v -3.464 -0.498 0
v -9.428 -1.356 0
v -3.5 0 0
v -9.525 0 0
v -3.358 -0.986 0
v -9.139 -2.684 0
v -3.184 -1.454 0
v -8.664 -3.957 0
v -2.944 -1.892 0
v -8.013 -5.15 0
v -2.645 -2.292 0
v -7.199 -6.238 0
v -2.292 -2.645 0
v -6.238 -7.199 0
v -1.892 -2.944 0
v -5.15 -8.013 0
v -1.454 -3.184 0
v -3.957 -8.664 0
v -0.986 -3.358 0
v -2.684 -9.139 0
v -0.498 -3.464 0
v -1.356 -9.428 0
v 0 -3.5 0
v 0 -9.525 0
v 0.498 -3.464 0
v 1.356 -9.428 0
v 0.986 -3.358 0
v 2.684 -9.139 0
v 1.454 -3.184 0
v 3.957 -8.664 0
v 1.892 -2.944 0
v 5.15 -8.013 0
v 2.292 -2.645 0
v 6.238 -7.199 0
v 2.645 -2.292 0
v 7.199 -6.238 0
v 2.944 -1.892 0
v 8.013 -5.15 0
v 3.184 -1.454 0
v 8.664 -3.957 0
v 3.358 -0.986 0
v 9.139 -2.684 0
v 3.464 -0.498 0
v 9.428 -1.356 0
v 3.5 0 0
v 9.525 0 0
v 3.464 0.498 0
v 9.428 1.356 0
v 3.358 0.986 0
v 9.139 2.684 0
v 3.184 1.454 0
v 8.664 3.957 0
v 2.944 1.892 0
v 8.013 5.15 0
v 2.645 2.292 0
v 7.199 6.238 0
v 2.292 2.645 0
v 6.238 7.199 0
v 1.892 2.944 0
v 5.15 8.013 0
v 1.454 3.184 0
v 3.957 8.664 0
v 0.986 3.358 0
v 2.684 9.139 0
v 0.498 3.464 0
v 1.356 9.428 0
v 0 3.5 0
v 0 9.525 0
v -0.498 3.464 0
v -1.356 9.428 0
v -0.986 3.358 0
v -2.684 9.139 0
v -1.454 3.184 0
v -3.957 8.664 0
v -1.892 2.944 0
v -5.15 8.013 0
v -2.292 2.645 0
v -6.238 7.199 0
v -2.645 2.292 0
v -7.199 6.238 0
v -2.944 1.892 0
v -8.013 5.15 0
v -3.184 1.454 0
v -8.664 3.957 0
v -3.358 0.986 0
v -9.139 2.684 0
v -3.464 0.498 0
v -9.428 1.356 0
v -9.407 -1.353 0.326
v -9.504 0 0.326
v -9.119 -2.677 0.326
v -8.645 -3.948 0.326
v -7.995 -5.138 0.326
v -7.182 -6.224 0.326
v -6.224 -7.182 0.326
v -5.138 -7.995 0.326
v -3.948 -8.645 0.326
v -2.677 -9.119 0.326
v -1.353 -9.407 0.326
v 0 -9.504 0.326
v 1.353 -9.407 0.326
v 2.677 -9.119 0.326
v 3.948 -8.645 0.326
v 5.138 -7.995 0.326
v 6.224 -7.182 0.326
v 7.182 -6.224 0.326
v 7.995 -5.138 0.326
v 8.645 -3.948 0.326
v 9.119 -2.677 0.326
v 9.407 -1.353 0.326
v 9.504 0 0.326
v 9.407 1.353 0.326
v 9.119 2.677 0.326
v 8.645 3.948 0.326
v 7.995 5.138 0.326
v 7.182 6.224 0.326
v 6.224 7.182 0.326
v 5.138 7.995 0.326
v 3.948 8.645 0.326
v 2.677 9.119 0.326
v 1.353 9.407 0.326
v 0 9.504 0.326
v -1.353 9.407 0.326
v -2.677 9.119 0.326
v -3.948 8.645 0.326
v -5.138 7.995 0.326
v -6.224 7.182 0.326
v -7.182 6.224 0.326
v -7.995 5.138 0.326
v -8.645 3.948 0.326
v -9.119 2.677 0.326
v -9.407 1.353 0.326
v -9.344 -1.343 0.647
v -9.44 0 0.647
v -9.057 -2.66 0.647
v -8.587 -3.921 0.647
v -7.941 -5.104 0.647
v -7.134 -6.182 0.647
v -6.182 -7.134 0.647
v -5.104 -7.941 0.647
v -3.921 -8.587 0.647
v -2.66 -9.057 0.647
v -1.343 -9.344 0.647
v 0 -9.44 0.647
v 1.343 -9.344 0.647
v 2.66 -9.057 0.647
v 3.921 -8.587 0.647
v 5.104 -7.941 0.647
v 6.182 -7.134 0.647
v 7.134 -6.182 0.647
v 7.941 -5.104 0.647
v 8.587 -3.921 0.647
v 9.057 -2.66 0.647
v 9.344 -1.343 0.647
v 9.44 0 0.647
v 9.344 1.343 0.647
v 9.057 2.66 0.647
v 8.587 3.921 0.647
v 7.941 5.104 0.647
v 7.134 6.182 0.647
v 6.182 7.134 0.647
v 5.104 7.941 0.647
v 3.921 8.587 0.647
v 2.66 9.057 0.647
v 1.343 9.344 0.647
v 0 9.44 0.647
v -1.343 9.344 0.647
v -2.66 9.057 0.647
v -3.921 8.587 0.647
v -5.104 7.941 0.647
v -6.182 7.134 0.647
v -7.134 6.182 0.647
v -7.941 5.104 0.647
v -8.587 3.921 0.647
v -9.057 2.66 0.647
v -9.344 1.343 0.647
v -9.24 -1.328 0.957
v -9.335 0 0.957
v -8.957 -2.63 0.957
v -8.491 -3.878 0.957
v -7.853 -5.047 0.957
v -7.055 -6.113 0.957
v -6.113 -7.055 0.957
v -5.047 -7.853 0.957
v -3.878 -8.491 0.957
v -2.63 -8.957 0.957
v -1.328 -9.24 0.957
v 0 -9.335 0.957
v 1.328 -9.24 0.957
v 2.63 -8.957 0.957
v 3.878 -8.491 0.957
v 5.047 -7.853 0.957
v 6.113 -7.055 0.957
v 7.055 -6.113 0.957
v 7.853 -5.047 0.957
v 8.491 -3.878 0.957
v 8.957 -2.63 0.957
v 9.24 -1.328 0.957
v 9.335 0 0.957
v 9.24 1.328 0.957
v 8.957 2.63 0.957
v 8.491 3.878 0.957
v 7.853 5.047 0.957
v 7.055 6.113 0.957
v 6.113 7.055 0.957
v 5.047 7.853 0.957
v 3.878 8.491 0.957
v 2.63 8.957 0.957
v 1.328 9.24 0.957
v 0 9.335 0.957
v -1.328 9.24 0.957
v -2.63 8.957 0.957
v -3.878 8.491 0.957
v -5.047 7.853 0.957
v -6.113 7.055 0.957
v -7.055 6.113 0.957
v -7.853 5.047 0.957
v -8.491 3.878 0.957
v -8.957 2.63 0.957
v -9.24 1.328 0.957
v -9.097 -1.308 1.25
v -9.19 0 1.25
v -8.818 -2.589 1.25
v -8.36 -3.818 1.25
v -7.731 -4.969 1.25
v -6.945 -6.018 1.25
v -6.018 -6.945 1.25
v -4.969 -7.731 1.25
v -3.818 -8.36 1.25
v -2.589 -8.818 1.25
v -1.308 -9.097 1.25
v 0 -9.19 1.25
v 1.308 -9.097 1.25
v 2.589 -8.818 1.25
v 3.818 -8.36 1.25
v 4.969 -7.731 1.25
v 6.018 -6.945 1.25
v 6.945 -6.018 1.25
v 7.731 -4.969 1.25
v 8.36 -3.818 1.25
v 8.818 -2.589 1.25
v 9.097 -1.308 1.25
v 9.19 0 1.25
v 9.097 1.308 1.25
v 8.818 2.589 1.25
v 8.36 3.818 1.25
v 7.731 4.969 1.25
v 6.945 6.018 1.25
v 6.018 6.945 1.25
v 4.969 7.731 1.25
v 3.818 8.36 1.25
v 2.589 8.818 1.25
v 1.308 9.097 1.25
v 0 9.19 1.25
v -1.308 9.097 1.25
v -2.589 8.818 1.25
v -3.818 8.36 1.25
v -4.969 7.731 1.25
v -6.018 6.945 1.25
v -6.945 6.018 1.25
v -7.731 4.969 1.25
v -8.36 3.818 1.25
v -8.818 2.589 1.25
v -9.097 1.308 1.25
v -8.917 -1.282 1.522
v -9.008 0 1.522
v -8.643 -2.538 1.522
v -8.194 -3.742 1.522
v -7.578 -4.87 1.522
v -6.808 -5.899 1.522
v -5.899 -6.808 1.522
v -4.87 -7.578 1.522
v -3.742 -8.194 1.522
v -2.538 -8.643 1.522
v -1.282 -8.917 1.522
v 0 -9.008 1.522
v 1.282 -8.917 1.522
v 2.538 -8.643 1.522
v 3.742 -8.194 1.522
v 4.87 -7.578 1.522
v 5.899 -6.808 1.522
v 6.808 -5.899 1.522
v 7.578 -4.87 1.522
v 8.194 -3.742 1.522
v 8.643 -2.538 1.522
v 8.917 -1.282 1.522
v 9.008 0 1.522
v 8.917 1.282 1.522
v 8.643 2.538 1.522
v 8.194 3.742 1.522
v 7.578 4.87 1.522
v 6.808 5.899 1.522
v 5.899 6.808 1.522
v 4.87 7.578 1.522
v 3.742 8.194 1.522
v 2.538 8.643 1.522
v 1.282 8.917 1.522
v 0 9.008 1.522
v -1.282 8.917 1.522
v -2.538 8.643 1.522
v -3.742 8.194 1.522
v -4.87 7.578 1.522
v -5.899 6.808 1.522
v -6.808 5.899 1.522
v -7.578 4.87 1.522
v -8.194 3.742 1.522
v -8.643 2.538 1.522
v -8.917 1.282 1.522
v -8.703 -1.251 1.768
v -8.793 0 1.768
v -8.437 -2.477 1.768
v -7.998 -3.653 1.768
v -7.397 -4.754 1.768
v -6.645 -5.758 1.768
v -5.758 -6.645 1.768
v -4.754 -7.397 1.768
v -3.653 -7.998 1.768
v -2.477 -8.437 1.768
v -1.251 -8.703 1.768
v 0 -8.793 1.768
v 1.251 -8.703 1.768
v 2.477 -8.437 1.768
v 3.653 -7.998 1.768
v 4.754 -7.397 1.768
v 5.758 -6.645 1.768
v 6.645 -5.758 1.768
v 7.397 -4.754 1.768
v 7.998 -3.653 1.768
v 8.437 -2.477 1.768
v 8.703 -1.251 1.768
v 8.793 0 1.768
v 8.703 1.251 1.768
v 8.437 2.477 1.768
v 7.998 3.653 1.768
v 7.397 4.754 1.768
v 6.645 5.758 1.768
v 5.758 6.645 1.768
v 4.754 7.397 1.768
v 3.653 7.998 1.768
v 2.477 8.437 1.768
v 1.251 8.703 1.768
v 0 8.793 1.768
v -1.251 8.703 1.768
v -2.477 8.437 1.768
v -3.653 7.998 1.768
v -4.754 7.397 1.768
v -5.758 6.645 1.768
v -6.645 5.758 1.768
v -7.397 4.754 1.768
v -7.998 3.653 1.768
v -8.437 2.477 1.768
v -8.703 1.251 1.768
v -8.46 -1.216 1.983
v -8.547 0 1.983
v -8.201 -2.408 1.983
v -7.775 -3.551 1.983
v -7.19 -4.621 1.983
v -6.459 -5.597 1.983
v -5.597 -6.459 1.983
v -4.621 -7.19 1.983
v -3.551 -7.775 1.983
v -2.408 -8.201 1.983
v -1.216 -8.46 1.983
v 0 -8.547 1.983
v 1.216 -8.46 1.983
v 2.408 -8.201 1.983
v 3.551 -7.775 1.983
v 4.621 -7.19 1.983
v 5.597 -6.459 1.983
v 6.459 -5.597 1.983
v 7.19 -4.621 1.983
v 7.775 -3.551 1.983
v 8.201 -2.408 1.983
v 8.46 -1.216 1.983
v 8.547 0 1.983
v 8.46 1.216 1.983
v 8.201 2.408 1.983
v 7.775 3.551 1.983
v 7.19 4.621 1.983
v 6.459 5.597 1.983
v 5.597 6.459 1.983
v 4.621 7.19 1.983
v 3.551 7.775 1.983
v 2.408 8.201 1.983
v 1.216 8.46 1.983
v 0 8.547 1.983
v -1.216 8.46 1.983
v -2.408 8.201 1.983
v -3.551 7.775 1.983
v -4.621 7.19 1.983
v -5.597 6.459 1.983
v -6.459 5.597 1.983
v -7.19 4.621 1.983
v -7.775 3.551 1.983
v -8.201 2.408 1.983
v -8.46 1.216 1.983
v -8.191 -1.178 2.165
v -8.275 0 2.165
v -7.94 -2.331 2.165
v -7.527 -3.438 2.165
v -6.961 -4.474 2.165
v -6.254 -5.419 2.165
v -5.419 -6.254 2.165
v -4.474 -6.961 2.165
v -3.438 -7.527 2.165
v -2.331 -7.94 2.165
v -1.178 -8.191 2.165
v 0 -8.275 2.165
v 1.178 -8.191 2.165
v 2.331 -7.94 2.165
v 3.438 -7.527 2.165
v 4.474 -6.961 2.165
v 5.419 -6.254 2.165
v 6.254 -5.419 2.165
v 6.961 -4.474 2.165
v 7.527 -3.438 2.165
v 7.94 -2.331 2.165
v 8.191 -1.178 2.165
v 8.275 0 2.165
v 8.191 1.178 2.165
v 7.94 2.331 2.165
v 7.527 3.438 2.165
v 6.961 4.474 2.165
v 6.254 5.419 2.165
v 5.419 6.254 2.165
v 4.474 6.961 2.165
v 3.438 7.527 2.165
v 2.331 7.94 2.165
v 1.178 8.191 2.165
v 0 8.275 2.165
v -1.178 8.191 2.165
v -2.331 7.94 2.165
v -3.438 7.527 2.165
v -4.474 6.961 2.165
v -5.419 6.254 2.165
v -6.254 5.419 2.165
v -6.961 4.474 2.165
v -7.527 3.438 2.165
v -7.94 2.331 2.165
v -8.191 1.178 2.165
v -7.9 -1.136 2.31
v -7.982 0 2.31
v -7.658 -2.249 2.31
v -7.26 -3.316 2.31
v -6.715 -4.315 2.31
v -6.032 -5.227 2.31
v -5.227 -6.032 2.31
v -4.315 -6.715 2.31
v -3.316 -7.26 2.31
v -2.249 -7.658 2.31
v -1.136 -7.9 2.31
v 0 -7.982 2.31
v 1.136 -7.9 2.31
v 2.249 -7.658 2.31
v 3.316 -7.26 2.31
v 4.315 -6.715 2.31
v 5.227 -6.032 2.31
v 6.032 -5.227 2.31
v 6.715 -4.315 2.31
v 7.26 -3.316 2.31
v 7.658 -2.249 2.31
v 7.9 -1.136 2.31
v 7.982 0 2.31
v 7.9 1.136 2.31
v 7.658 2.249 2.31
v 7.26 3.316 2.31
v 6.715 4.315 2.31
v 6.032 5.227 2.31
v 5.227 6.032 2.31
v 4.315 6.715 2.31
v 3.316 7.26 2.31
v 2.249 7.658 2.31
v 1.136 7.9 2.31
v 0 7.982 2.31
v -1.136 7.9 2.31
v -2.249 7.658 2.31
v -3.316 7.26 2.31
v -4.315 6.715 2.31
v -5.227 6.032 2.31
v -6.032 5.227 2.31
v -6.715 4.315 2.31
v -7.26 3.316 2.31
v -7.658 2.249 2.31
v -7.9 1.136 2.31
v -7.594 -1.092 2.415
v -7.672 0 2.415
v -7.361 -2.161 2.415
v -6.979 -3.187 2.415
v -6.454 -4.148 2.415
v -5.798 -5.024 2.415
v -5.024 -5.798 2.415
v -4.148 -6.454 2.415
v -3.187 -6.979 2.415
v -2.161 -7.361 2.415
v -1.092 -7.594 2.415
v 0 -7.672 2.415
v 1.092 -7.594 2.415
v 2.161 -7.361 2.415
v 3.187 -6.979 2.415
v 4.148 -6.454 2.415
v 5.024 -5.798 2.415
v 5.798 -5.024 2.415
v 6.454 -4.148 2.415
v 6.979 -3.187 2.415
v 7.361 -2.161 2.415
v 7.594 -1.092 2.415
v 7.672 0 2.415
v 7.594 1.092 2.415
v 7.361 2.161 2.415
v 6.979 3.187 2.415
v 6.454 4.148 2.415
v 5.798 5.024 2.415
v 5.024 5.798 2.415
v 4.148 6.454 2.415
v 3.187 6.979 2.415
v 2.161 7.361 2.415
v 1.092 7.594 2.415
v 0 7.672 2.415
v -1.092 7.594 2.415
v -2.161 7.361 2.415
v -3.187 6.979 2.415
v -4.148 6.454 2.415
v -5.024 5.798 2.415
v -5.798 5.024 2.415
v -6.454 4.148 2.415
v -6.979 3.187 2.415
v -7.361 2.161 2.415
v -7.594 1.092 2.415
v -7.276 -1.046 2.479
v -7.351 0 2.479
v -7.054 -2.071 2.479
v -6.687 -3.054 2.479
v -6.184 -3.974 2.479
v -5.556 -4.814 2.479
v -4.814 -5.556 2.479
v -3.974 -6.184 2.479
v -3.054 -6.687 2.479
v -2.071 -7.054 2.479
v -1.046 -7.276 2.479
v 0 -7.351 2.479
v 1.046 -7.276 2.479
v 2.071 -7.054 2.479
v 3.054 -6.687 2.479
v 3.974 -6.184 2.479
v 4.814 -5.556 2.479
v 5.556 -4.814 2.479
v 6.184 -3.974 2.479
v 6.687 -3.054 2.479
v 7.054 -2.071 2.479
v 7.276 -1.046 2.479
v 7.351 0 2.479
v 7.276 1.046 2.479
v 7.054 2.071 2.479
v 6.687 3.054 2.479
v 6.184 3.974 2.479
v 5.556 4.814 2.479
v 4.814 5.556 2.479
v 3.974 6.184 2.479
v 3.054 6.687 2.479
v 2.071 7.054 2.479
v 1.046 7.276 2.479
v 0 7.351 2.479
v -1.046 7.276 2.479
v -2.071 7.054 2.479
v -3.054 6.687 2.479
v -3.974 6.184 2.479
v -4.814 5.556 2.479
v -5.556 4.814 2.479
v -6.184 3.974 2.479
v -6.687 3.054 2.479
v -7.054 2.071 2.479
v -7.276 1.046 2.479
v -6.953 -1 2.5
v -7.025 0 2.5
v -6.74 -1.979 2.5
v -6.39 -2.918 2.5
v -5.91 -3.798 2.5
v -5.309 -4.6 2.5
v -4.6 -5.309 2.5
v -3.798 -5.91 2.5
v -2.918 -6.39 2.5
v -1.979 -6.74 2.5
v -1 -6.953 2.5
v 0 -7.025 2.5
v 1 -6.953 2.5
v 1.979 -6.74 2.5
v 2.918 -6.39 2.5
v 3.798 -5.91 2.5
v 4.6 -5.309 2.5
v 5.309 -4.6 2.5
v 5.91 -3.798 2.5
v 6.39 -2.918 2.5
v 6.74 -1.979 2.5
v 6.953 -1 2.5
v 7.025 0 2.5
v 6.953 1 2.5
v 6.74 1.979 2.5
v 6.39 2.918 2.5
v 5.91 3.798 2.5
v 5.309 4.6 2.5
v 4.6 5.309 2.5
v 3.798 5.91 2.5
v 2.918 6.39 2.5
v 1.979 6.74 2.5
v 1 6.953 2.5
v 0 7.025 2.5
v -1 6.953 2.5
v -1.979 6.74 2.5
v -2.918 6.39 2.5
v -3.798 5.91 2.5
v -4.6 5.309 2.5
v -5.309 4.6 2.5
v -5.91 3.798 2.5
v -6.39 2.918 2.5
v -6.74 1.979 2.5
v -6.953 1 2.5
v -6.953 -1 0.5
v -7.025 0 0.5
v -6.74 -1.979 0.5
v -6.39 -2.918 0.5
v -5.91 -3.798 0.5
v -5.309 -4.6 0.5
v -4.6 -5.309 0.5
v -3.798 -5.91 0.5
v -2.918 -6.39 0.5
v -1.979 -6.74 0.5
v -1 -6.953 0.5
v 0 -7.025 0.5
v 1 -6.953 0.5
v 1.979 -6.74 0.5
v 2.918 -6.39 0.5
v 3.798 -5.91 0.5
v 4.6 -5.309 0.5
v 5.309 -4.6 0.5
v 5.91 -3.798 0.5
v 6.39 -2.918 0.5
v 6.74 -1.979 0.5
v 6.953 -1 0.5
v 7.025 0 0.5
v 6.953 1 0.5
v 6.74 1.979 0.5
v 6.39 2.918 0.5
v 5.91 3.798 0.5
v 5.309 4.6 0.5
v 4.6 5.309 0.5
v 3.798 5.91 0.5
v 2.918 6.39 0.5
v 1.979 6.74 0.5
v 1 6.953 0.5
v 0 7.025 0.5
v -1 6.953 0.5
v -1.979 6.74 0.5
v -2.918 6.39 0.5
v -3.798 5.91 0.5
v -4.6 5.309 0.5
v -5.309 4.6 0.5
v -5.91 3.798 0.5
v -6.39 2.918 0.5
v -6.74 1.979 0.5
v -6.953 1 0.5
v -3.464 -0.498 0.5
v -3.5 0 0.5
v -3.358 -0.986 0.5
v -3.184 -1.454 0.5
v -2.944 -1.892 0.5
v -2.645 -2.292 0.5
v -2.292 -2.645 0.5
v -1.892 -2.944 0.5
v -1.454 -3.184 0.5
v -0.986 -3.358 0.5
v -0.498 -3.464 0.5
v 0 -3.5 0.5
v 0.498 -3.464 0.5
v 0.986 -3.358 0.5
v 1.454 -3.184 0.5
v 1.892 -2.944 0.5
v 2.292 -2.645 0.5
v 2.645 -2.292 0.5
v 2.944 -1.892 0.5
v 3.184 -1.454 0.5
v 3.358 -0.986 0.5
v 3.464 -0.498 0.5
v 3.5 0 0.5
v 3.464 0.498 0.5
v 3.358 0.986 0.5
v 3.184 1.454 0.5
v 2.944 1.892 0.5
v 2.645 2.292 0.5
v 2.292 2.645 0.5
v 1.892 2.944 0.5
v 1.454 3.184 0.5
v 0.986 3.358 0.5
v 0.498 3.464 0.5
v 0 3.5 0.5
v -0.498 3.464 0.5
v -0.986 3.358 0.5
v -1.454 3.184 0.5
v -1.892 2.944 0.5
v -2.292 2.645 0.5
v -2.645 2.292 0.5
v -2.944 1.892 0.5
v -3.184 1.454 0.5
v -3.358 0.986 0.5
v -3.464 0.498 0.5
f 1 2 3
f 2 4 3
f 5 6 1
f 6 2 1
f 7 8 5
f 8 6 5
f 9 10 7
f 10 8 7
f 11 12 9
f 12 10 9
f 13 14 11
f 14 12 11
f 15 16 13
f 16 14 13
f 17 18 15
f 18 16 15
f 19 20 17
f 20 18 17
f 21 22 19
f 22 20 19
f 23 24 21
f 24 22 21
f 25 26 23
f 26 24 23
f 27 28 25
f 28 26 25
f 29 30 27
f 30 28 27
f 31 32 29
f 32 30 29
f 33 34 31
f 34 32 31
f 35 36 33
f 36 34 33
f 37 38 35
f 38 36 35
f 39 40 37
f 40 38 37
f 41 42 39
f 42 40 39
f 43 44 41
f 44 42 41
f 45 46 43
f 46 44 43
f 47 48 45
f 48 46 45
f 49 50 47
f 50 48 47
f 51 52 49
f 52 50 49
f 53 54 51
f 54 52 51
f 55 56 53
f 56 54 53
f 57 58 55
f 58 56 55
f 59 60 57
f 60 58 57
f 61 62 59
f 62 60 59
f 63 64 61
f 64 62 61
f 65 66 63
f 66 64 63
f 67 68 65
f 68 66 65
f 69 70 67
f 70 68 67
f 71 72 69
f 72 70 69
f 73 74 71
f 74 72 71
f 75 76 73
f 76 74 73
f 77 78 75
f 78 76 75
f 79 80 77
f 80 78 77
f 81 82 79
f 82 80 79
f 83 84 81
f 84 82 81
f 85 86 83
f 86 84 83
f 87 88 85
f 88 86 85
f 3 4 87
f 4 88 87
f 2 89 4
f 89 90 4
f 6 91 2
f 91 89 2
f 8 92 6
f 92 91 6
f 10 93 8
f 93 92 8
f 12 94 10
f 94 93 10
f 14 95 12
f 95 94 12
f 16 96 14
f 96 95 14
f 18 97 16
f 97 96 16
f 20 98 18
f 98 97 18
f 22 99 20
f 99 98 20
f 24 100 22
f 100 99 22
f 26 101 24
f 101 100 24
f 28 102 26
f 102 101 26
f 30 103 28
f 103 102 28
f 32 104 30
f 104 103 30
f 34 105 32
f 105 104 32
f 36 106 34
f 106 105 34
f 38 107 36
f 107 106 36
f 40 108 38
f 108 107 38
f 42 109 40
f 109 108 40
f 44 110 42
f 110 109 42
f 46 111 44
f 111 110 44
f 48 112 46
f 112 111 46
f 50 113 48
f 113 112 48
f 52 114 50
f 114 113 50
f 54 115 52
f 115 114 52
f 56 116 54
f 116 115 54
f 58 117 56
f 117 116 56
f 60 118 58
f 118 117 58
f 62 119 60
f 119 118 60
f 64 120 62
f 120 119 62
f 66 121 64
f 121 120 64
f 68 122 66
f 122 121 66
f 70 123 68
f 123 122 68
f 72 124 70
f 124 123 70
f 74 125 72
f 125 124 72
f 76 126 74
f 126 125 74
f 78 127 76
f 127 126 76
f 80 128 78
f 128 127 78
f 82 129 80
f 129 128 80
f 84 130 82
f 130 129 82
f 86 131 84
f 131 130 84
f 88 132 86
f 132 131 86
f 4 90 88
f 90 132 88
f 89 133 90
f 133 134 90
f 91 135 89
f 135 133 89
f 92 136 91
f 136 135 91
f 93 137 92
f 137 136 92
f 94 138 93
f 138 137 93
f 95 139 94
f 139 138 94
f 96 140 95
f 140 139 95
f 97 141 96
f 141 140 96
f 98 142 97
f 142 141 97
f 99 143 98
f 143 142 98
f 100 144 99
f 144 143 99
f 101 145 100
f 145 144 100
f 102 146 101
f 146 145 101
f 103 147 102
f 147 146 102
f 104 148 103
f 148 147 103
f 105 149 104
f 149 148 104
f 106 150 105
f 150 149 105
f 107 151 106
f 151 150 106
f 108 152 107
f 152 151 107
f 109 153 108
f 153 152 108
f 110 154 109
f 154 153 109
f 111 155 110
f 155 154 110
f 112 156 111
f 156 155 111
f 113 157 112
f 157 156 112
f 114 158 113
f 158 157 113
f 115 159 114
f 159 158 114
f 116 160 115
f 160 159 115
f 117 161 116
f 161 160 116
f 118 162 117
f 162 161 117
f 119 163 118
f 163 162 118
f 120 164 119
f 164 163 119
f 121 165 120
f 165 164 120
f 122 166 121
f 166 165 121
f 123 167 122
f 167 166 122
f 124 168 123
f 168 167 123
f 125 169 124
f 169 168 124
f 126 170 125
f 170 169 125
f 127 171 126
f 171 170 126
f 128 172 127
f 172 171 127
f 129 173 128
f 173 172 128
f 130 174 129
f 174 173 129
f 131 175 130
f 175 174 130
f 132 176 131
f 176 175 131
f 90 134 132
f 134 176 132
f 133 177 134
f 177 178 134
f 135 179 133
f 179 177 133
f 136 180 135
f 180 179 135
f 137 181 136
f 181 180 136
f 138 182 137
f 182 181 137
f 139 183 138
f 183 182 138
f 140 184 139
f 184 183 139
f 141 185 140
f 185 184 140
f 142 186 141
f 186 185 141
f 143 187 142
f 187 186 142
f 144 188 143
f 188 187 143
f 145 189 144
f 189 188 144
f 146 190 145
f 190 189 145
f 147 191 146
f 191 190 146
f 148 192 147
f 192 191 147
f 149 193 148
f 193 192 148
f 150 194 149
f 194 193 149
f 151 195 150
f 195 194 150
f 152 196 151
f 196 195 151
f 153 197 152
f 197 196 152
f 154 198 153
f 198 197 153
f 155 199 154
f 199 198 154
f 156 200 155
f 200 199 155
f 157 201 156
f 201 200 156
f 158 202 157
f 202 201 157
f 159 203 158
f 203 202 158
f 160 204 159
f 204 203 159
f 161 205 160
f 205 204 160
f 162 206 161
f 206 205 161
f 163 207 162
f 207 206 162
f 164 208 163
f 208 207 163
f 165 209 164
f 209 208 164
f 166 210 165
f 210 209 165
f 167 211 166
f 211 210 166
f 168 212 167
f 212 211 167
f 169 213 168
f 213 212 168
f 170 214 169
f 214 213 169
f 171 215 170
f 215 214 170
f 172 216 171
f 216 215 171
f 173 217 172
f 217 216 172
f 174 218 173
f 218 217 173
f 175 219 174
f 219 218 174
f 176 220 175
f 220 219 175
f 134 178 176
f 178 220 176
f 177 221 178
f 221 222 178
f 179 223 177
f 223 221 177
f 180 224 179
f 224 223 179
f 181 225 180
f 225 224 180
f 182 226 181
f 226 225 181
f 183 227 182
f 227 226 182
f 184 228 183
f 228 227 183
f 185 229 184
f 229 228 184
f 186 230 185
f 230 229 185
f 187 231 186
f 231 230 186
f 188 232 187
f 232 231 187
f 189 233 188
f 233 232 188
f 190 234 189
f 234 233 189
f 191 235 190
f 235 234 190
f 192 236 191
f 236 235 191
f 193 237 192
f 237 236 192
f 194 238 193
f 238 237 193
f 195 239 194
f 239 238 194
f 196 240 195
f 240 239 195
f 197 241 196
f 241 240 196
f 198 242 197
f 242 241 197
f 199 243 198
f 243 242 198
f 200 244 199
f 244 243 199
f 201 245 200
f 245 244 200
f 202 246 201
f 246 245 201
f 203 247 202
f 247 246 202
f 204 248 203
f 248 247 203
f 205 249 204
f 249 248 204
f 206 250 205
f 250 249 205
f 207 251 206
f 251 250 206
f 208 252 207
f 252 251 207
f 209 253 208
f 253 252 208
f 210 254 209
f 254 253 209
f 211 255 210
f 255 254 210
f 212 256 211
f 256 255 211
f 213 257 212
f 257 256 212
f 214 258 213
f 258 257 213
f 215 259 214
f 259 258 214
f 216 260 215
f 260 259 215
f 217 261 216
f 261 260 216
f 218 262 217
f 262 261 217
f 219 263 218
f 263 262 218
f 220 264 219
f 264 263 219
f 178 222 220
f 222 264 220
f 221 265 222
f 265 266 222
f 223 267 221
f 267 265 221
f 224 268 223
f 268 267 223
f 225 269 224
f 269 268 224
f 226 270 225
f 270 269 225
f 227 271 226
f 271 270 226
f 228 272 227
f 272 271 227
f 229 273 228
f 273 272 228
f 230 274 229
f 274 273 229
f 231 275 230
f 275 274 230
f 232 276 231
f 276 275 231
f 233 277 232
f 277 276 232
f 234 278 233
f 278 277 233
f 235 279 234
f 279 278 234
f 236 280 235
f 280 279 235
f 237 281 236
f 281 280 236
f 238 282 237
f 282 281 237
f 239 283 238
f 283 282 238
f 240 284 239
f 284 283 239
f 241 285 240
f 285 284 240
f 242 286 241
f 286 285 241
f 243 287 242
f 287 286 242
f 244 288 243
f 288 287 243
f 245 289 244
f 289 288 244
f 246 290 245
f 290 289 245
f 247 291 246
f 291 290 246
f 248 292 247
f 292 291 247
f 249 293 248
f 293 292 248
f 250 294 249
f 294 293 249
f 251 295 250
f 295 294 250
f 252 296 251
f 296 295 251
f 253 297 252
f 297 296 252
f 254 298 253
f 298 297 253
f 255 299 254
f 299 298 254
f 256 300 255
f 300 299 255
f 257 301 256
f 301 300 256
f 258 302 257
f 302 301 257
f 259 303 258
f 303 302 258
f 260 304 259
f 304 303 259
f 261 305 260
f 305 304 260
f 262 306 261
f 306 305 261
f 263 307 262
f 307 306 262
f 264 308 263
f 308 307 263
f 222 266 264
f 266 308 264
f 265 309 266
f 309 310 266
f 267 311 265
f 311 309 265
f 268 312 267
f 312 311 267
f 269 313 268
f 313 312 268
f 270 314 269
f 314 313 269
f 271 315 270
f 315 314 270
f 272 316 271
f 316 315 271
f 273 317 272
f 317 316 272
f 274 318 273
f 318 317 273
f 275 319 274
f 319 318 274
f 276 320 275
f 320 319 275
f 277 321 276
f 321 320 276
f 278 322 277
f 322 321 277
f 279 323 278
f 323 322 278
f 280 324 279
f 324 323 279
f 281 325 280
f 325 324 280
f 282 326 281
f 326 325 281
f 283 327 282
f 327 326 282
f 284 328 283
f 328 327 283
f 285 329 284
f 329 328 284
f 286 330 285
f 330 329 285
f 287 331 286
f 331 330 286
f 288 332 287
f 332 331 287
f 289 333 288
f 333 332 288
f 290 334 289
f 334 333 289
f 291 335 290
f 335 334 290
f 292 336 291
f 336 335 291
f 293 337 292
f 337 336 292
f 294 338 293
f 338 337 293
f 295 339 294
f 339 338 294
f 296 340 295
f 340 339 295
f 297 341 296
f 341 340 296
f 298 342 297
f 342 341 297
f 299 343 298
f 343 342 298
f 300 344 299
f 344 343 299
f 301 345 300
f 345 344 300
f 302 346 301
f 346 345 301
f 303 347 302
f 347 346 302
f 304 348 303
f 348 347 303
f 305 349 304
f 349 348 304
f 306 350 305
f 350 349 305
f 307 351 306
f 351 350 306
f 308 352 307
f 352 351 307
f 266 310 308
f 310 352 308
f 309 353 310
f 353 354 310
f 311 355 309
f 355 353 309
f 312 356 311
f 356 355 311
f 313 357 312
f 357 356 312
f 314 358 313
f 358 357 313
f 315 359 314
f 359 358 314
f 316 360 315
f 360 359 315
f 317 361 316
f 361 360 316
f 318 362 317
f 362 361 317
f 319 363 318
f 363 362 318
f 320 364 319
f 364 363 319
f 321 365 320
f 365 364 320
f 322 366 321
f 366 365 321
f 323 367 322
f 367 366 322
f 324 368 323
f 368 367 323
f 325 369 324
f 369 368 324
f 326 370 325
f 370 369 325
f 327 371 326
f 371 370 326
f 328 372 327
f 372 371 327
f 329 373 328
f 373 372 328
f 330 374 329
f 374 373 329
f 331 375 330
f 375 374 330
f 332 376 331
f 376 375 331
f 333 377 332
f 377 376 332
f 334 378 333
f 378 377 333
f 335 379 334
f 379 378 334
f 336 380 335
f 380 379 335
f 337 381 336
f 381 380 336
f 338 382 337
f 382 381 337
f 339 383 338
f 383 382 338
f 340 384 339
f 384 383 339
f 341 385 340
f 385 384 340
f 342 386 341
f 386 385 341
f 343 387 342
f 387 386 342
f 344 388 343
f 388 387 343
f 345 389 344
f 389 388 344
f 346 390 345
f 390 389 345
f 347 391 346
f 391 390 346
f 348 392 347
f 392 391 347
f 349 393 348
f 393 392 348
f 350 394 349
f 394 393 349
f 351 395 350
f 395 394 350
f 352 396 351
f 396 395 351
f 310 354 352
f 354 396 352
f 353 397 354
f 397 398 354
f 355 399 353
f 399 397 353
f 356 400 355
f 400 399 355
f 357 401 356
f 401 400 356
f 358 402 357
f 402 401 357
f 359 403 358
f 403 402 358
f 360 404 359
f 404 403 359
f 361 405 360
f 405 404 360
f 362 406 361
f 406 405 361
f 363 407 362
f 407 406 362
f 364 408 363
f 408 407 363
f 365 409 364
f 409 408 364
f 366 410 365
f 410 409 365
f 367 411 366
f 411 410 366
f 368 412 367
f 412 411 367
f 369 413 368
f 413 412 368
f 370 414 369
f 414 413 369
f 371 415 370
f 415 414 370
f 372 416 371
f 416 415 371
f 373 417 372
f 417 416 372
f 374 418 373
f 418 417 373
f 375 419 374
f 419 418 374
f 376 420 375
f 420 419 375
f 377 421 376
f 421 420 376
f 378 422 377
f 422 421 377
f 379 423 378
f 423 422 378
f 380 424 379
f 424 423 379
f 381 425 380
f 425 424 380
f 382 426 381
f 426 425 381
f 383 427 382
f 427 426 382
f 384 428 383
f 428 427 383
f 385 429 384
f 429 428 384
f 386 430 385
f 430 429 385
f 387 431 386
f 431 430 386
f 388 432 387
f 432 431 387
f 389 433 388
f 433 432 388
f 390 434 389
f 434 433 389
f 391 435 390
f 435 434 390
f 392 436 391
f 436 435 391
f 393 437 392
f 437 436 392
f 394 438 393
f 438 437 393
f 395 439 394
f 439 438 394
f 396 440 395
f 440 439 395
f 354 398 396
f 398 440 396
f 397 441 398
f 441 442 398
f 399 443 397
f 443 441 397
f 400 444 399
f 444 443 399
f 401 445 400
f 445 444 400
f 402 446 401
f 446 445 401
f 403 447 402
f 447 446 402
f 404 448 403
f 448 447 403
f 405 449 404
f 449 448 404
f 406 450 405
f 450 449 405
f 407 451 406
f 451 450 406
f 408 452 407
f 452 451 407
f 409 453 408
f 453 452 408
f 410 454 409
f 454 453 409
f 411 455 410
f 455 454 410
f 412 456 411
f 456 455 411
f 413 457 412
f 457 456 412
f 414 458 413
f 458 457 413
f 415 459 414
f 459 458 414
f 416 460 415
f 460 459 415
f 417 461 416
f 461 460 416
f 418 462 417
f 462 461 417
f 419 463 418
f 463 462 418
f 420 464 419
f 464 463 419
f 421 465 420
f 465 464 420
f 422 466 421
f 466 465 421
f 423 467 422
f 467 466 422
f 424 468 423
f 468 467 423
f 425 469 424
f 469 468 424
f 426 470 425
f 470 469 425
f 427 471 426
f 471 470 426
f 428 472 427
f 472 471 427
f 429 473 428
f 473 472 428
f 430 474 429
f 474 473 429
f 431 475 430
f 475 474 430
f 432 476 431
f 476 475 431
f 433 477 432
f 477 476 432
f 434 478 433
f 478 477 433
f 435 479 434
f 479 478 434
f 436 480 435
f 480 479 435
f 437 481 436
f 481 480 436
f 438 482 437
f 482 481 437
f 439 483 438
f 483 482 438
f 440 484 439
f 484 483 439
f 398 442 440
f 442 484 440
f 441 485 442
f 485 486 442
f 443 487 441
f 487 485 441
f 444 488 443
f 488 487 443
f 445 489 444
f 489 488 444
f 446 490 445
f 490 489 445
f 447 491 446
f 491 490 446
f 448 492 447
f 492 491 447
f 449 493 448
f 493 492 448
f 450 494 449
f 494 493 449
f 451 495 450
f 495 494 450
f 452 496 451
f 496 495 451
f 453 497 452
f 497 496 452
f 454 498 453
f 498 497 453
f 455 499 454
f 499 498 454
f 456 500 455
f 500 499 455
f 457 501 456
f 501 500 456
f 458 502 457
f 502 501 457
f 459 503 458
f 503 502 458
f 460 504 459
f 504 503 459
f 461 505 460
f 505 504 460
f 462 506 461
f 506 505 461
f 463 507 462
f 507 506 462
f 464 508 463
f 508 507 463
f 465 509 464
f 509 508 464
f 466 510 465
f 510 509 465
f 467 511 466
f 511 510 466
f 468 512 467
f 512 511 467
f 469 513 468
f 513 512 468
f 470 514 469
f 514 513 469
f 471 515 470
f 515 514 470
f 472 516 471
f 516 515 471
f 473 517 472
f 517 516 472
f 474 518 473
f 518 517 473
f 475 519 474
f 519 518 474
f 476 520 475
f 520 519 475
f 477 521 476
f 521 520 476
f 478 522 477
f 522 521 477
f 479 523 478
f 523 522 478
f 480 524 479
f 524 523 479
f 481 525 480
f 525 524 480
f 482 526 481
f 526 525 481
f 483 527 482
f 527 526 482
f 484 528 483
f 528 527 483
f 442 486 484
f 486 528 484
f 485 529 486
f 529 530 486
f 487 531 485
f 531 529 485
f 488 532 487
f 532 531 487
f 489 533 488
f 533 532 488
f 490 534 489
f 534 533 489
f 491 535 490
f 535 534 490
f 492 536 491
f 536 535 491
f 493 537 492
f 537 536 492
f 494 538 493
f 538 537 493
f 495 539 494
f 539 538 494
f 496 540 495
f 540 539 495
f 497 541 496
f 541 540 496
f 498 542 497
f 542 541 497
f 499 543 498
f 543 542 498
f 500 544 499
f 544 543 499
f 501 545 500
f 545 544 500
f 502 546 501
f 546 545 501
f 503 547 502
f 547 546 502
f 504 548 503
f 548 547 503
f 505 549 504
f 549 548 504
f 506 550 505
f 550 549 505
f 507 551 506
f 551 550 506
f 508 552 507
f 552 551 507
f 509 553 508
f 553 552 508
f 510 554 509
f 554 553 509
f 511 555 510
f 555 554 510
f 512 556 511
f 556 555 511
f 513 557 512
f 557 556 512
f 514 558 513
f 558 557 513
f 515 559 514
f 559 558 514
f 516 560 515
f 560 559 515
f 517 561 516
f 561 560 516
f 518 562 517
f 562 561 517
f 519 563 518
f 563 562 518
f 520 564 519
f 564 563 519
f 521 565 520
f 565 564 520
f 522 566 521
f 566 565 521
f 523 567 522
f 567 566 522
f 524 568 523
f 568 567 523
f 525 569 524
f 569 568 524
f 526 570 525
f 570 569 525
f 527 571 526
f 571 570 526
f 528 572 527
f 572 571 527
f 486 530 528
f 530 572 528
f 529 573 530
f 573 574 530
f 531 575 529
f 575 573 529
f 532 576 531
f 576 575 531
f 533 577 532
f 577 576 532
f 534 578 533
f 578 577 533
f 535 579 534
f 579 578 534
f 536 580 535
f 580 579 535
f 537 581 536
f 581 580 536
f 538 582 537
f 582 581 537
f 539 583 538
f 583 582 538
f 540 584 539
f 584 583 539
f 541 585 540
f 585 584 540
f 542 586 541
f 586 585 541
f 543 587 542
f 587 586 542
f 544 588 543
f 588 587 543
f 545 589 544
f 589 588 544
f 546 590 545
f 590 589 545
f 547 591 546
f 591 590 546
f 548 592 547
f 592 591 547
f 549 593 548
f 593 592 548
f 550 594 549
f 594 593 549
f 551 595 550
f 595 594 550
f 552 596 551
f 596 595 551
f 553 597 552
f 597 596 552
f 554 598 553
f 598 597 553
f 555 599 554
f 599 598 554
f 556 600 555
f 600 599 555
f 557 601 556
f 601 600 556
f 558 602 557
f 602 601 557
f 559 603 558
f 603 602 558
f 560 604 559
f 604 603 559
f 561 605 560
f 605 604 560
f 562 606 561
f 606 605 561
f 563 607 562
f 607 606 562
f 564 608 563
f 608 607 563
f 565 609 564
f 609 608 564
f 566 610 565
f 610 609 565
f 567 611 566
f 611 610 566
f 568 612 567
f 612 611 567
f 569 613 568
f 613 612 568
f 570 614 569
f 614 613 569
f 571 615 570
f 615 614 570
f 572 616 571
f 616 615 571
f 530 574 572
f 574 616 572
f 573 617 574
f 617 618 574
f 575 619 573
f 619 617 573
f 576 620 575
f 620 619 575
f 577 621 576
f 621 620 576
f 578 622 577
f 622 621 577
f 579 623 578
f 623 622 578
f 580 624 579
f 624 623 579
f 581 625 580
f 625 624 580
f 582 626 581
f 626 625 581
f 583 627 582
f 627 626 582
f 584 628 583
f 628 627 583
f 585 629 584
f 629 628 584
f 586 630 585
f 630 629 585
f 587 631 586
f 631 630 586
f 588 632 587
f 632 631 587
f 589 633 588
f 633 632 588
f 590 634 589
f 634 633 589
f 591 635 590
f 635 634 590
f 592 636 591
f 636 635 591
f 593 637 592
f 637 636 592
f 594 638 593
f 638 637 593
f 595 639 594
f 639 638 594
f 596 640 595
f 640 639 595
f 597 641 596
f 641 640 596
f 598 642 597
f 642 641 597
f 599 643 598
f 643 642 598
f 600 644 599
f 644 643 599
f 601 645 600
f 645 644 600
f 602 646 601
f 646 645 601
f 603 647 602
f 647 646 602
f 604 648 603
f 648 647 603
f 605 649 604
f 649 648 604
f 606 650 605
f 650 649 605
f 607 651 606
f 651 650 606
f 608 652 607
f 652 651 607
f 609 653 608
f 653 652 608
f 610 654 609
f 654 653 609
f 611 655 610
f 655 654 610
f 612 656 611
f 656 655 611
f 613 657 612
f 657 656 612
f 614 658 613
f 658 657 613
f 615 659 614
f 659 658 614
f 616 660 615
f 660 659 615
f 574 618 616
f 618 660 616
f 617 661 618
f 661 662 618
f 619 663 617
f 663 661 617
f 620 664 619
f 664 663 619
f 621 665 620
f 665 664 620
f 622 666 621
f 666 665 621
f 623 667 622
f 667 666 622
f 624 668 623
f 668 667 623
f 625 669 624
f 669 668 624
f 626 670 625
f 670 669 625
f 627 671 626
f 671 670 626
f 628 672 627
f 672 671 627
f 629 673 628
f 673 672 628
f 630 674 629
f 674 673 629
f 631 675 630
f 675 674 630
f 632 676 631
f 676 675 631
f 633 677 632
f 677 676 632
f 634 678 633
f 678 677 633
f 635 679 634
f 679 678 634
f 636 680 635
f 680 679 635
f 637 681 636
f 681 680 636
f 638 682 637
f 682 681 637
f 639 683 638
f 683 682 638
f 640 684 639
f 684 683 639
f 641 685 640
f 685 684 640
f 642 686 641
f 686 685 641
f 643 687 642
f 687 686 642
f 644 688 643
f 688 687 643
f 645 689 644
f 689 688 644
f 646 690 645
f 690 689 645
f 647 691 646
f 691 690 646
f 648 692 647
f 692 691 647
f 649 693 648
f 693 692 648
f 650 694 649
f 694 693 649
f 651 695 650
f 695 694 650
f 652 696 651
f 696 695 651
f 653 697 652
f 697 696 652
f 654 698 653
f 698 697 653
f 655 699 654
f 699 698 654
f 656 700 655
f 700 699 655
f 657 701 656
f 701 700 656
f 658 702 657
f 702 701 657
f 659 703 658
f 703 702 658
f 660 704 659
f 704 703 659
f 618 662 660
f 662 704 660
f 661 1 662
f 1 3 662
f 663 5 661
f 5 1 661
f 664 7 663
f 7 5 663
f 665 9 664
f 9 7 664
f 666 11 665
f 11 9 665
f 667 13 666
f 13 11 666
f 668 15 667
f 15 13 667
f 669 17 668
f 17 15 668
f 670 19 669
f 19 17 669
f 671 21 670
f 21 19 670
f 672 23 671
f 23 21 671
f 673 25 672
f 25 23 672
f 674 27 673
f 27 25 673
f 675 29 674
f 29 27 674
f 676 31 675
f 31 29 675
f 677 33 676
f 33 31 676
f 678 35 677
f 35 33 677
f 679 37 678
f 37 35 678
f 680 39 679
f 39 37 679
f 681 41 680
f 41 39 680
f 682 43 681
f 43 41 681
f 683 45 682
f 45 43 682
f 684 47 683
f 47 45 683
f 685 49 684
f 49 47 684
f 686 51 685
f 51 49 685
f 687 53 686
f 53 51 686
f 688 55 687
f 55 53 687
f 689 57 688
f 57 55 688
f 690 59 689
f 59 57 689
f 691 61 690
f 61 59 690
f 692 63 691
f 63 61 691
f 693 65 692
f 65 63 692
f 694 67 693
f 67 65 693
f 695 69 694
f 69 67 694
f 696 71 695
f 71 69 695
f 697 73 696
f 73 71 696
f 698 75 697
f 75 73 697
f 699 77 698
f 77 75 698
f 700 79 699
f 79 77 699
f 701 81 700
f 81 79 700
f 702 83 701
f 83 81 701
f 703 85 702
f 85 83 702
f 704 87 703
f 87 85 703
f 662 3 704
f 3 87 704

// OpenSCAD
// NotebookDisc0.2
// 
// Can I print half-discs for discbound notebooks
// that are later glued together into full discs?
// 
// v0.2:
// - Add `cap_x_scale` option

cap_diameter = "5mm";
cap_x_scale = 1.00; // 0.01
stem_thickness = "1mm";
disc_diameter = "3/4inch";
center_hole_diameter = "7mm";

$fn = 48;

module __asdaskjdnakjsnd__end_params() { }

use <../lib/TOGMod1.scad>
use <../lib/TOGPath1.scad>
use <../lib/TOGPolyhedronLib1.scad>
use <../lib/TOGUnits1.scad>

cap_diameter_mm         = togunits1_to_mm(cap_diameter         );
stem_thickness_mm       = togunits1_to_mm(stem_thickness       );
disc_diameter_mm        = togunits1_to_mm(disc_diameter        );
center_hole_diameter_mm = togunits1_to_mm(center_hole_diameter );

togmod1_domodule(
	tphl1_make_polyhedron_from_layer_function(
		let( quarterfn = max(1,ceil($fn/4)) )
		[
			[0                  , center_hole_diameter_mm/2],
			for(i=[0:1:quarterfn]) let(a=i*90/quarterfn) [0 + sin(a) * cap_diameter_mm / 2, disc_diameter_mm/2 + (cos(a) - 1) * cap_diameter_mm/2 * cap_x_scale],
			[stem_thickness_mm/2, disc_diameter_mm/2 - cap_diameter_mm/2 * cap_x_scale],
			[stem_thickness_mm/2, center_hole_diameter_mm/2],
			[0                  , center_hole_diameter_mm/2],
		],
		function(zr) togpath1_rath_to_polypoints(togpath1_make_circle_rath(r=zr[1])),
		layer_points_transform = "key0-to-z",
		cap_bottom = false,
		cap_top = false
	)
);
